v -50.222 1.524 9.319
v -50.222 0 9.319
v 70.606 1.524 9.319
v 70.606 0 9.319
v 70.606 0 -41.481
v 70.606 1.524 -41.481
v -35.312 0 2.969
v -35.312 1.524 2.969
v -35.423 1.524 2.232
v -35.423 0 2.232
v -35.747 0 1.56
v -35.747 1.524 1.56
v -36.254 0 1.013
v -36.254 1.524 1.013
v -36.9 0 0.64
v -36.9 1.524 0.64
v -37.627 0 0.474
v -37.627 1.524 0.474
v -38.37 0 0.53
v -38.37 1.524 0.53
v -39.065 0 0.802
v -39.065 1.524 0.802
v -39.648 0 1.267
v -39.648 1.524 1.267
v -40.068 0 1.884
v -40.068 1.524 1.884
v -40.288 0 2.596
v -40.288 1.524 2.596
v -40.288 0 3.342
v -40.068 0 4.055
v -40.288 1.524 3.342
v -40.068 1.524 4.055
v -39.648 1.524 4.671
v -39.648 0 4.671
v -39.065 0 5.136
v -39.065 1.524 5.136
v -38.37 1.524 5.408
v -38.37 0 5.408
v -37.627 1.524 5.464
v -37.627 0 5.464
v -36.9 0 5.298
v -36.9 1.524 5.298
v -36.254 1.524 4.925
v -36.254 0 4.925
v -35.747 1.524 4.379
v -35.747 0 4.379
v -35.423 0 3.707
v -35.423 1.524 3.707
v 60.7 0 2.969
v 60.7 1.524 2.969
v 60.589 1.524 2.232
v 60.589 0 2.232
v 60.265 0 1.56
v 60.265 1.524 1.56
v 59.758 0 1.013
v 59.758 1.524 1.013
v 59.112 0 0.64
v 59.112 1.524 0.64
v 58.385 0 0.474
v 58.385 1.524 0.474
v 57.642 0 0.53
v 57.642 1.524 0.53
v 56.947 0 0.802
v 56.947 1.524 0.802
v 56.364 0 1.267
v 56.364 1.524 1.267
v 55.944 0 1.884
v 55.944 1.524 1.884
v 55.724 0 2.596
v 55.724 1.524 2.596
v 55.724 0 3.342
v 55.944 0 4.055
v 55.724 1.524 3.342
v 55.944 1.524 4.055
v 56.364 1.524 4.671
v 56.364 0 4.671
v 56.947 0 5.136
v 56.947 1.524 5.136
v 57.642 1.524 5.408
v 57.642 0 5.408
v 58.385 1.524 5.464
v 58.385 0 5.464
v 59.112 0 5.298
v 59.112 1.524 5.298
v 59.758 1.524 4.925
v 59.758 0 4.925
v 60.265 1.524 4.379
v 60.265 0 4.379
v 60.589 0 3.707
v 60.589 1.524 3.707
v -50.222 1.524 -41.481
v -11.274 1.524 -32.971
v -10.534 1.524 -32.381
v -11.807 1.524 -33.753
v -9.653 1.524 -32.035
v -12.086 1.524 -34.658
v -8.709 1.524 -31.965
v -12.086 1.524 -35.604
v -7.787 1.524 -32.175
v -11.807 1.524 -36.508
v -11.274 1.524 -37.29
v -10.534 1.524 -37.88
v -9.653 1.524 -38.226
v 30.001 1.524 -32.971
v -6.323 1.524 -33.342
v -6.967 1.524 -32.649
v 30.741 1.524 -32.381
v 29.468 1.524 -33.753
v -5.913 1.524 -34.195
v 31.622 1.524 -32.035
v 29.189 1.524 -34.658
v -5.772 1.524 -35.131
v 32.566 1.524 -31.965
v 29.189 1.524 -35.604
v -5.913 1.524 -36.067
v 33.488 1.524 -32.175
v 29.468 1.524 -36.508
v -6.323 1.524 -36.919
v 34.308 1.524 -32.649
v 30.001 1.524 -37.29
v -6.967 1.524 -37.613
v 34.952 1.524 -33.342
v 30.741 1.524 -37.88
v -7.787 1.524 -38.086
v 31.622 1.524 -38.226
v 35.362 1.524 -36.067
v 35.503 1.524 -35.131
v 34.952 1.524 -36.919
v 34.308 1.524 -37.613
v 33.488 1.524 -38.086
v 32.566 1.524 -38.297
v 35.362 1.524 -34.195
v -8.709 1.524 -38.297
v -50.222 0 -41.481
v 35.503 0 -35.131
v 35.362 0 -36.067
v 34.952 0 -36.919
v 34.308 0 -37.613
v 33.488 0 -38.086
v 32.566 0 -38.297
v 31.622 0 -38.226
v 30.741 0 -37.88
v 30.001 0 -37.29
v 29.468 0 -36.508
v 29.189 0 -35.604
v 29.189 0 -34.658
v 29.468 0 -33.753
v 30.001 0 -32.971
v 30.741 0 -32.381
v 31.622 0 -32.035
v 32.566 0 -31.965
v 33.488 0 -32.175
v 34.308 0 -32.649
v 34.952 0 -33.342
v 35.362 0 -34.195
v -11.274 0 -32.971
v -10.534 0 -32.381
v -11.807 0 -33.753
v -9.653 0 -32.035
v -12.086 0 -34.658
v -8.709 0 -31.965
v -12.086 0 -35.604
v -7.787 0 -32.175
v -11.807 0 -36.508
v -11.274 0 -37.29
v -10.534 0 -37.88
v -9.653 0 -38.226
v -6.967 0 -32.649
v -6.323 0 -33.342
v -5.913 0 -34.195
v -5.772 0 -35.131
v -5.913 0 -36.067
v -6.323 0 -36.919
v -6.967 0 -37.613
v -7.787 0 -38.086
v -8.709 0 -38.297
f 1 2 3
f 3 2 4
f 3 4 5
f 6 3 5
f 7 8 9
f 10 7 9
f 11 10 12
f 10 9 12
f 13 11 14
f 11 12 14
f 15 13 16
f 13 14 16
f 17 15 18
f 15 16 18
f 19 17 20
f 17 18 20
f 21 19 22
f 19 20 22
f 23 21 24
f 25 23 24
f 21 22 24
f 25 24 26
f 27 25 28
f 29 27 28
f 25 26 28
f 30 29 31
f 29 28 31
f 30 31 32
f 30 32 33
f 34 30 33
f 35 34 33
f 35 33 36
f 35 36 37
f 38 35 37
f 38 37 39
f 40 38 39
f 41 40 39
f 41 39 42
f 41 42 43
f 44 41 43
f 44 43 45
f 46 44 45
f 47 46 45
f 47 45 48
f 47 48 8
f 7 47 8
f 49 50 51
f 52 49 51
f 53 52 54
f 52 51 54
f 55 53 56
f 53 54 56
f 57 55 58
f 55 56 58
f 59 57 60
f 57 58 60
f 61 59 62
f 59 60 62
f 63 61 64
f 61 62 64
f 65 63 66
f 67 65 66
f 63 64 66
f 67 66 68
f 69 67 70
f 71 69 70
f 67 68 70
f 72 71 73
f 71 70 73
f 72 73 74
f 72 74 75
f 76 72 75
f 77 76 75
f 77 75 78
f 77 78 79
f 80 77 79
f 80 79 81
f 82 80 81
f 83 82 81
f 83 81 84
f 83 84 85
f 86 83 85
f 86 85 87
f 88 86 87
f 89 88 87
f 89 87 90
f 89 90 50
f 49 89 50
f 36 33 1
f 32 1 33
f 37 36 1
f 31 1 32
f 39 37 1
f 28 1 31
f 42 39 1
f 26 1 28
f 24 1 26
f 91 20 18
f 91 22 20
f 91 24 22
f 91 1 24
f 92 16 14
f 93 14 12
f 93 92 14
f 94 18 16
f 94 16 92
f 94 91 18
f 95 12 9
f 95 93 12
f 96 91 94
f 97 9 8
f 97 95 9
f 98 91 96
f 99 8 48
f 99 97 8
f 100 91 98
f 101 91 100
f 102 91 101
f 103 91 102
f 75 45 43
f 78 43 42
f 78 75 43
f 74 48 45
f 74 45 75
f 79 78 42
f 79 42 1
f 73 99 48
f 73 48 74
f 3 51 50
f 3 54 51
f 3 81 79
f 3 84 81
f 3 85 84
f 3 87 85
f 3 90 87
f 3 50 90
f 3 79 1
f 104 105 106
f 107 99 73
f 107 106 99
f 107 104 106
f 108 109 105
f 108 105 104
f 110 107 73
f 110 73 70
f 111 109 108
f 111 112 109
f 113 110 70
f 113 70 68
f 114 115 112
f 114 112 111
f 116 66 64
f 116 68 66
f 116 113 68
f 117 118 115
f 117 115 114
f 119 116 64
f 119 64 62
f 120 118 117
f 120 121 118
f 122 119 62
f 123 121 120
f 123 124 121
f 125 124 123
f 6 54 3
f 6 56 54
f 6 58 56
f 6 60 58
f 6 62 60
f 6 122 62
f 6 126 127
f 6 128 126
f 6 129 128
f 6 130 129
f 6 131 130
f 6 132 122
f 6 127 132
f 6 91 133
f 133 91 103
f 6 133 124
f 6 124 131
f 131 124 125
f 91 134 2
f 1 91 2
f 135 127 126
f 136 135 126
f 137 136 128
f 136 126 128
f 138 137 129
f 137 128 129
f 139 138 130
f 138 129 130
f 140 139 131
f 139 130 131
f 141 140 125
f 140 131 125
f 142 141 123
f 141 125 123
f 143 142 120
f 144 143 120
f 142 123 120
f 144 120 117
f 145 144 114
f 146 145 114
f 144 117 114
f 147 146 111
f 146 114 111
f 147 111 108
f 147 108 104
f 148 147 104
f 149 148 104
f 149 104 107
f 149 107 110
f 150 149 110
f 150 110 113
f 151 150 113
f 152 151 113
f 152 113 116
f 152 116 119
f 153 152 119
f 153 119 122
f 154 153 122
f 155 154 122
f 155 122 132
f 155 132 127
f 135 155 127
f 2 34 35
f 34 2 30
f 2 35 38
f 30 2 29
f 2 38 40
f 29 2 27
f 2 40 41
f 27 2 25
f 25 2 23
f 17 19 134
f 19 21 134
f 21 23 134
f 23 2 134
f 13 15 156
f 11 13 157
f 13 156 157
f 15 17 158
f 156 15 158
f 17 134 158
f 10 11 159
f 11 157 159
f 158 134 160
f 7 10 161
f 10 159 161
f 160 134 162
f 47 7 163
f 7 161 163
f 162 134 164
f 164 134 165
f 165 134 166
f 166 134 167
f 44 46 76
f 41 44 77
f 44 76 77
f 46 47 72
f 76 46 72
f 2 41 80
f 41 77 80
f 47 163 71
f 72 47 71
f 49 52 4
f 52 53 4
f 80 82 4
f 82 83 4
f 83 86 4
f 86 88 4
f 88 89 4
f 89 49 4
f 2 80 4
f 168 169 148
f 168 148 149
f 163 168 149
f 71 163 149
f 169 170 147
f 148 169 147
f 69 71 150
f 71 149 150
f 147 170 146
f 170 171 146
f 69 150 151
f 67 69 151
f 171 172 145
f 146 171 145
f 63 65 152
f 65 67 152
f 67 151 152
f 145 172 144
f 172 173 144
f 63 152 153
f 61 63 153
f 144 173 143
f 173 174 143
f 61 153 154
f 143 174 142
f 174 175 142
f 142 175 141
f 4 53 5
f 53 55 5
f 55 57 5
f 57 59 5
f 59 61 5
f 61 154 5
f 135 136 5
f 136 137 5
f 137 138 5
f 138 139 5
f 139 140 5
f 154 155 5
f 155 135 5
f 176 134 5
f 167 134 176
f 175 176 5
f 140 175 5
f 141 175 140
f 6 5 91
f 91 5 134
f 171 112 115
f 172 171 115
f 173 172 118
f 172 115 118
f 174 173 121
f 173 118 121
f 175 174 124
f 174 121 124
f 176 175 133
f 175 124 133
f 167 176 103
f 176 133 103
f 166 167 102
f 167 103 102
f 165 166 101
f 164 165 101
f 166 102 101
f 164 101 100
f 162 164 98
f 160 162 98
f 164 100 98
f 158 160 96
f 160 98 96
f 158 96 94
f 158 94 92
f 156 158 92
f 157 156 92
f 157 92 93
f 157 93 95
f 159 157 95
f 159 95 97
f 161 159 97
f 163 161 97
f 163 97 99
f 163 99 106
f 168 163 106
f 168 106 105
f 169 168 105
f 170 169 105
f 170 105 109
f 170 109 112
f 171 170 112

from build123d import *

# Parameters (mm, degrees)
BOSS_EXTRUDE1_DEPTH = 1.524
SKETCH2_R           = 2.5019
SKETCH2_R_2         = 3.175
CUT_EXTRUDE1_DEPTH  = 2.524


with BuildPart() as part:
    # Sketch1 → Boss-Extrude1 (new body)
    with BuildSketch(Plane(origin=(0, 0, 0), x_dir=(1, 0, 0), z_dir=(0, 1, 0))):
        Polygon((-50.221590033, -9.319139437), (70.606209967, -9.319139437), (70.606209967, 41.480860563), (35.630409967, 41.480860563), (-15.169590033, 41.480860563), (-50.221590033, 41.480860563), align=None)
    extrude(amount=BOSS_EXTRUDE1_DEPTH)

    # Sketch2 → Cut-Extrude1 (cut, through all)
    with BuildSketch(Plane(origin=(0, 1.524, 0), x_dir=(1, 0, 0), z_dir=(0, 1, 0))):
        with Locations((-37.813690033, -2.969139437)):
            Circle(SKETCH2_R)
        with Locations((58.198309967, -2.969139437)):
            Circle(SKETCH2_R)
        with Locations((32.328409967, 35.130860563)):
            Circle(SKETCH2_R_2)
        with Locations((-8.946590033, 35.130860563)):
            Circle(SKETCH2_R_2)
    extrude(amount=-CUT_EXTRUDE1_DEPTH, mode=Mode.SUBTRACT)


solid = part.part
